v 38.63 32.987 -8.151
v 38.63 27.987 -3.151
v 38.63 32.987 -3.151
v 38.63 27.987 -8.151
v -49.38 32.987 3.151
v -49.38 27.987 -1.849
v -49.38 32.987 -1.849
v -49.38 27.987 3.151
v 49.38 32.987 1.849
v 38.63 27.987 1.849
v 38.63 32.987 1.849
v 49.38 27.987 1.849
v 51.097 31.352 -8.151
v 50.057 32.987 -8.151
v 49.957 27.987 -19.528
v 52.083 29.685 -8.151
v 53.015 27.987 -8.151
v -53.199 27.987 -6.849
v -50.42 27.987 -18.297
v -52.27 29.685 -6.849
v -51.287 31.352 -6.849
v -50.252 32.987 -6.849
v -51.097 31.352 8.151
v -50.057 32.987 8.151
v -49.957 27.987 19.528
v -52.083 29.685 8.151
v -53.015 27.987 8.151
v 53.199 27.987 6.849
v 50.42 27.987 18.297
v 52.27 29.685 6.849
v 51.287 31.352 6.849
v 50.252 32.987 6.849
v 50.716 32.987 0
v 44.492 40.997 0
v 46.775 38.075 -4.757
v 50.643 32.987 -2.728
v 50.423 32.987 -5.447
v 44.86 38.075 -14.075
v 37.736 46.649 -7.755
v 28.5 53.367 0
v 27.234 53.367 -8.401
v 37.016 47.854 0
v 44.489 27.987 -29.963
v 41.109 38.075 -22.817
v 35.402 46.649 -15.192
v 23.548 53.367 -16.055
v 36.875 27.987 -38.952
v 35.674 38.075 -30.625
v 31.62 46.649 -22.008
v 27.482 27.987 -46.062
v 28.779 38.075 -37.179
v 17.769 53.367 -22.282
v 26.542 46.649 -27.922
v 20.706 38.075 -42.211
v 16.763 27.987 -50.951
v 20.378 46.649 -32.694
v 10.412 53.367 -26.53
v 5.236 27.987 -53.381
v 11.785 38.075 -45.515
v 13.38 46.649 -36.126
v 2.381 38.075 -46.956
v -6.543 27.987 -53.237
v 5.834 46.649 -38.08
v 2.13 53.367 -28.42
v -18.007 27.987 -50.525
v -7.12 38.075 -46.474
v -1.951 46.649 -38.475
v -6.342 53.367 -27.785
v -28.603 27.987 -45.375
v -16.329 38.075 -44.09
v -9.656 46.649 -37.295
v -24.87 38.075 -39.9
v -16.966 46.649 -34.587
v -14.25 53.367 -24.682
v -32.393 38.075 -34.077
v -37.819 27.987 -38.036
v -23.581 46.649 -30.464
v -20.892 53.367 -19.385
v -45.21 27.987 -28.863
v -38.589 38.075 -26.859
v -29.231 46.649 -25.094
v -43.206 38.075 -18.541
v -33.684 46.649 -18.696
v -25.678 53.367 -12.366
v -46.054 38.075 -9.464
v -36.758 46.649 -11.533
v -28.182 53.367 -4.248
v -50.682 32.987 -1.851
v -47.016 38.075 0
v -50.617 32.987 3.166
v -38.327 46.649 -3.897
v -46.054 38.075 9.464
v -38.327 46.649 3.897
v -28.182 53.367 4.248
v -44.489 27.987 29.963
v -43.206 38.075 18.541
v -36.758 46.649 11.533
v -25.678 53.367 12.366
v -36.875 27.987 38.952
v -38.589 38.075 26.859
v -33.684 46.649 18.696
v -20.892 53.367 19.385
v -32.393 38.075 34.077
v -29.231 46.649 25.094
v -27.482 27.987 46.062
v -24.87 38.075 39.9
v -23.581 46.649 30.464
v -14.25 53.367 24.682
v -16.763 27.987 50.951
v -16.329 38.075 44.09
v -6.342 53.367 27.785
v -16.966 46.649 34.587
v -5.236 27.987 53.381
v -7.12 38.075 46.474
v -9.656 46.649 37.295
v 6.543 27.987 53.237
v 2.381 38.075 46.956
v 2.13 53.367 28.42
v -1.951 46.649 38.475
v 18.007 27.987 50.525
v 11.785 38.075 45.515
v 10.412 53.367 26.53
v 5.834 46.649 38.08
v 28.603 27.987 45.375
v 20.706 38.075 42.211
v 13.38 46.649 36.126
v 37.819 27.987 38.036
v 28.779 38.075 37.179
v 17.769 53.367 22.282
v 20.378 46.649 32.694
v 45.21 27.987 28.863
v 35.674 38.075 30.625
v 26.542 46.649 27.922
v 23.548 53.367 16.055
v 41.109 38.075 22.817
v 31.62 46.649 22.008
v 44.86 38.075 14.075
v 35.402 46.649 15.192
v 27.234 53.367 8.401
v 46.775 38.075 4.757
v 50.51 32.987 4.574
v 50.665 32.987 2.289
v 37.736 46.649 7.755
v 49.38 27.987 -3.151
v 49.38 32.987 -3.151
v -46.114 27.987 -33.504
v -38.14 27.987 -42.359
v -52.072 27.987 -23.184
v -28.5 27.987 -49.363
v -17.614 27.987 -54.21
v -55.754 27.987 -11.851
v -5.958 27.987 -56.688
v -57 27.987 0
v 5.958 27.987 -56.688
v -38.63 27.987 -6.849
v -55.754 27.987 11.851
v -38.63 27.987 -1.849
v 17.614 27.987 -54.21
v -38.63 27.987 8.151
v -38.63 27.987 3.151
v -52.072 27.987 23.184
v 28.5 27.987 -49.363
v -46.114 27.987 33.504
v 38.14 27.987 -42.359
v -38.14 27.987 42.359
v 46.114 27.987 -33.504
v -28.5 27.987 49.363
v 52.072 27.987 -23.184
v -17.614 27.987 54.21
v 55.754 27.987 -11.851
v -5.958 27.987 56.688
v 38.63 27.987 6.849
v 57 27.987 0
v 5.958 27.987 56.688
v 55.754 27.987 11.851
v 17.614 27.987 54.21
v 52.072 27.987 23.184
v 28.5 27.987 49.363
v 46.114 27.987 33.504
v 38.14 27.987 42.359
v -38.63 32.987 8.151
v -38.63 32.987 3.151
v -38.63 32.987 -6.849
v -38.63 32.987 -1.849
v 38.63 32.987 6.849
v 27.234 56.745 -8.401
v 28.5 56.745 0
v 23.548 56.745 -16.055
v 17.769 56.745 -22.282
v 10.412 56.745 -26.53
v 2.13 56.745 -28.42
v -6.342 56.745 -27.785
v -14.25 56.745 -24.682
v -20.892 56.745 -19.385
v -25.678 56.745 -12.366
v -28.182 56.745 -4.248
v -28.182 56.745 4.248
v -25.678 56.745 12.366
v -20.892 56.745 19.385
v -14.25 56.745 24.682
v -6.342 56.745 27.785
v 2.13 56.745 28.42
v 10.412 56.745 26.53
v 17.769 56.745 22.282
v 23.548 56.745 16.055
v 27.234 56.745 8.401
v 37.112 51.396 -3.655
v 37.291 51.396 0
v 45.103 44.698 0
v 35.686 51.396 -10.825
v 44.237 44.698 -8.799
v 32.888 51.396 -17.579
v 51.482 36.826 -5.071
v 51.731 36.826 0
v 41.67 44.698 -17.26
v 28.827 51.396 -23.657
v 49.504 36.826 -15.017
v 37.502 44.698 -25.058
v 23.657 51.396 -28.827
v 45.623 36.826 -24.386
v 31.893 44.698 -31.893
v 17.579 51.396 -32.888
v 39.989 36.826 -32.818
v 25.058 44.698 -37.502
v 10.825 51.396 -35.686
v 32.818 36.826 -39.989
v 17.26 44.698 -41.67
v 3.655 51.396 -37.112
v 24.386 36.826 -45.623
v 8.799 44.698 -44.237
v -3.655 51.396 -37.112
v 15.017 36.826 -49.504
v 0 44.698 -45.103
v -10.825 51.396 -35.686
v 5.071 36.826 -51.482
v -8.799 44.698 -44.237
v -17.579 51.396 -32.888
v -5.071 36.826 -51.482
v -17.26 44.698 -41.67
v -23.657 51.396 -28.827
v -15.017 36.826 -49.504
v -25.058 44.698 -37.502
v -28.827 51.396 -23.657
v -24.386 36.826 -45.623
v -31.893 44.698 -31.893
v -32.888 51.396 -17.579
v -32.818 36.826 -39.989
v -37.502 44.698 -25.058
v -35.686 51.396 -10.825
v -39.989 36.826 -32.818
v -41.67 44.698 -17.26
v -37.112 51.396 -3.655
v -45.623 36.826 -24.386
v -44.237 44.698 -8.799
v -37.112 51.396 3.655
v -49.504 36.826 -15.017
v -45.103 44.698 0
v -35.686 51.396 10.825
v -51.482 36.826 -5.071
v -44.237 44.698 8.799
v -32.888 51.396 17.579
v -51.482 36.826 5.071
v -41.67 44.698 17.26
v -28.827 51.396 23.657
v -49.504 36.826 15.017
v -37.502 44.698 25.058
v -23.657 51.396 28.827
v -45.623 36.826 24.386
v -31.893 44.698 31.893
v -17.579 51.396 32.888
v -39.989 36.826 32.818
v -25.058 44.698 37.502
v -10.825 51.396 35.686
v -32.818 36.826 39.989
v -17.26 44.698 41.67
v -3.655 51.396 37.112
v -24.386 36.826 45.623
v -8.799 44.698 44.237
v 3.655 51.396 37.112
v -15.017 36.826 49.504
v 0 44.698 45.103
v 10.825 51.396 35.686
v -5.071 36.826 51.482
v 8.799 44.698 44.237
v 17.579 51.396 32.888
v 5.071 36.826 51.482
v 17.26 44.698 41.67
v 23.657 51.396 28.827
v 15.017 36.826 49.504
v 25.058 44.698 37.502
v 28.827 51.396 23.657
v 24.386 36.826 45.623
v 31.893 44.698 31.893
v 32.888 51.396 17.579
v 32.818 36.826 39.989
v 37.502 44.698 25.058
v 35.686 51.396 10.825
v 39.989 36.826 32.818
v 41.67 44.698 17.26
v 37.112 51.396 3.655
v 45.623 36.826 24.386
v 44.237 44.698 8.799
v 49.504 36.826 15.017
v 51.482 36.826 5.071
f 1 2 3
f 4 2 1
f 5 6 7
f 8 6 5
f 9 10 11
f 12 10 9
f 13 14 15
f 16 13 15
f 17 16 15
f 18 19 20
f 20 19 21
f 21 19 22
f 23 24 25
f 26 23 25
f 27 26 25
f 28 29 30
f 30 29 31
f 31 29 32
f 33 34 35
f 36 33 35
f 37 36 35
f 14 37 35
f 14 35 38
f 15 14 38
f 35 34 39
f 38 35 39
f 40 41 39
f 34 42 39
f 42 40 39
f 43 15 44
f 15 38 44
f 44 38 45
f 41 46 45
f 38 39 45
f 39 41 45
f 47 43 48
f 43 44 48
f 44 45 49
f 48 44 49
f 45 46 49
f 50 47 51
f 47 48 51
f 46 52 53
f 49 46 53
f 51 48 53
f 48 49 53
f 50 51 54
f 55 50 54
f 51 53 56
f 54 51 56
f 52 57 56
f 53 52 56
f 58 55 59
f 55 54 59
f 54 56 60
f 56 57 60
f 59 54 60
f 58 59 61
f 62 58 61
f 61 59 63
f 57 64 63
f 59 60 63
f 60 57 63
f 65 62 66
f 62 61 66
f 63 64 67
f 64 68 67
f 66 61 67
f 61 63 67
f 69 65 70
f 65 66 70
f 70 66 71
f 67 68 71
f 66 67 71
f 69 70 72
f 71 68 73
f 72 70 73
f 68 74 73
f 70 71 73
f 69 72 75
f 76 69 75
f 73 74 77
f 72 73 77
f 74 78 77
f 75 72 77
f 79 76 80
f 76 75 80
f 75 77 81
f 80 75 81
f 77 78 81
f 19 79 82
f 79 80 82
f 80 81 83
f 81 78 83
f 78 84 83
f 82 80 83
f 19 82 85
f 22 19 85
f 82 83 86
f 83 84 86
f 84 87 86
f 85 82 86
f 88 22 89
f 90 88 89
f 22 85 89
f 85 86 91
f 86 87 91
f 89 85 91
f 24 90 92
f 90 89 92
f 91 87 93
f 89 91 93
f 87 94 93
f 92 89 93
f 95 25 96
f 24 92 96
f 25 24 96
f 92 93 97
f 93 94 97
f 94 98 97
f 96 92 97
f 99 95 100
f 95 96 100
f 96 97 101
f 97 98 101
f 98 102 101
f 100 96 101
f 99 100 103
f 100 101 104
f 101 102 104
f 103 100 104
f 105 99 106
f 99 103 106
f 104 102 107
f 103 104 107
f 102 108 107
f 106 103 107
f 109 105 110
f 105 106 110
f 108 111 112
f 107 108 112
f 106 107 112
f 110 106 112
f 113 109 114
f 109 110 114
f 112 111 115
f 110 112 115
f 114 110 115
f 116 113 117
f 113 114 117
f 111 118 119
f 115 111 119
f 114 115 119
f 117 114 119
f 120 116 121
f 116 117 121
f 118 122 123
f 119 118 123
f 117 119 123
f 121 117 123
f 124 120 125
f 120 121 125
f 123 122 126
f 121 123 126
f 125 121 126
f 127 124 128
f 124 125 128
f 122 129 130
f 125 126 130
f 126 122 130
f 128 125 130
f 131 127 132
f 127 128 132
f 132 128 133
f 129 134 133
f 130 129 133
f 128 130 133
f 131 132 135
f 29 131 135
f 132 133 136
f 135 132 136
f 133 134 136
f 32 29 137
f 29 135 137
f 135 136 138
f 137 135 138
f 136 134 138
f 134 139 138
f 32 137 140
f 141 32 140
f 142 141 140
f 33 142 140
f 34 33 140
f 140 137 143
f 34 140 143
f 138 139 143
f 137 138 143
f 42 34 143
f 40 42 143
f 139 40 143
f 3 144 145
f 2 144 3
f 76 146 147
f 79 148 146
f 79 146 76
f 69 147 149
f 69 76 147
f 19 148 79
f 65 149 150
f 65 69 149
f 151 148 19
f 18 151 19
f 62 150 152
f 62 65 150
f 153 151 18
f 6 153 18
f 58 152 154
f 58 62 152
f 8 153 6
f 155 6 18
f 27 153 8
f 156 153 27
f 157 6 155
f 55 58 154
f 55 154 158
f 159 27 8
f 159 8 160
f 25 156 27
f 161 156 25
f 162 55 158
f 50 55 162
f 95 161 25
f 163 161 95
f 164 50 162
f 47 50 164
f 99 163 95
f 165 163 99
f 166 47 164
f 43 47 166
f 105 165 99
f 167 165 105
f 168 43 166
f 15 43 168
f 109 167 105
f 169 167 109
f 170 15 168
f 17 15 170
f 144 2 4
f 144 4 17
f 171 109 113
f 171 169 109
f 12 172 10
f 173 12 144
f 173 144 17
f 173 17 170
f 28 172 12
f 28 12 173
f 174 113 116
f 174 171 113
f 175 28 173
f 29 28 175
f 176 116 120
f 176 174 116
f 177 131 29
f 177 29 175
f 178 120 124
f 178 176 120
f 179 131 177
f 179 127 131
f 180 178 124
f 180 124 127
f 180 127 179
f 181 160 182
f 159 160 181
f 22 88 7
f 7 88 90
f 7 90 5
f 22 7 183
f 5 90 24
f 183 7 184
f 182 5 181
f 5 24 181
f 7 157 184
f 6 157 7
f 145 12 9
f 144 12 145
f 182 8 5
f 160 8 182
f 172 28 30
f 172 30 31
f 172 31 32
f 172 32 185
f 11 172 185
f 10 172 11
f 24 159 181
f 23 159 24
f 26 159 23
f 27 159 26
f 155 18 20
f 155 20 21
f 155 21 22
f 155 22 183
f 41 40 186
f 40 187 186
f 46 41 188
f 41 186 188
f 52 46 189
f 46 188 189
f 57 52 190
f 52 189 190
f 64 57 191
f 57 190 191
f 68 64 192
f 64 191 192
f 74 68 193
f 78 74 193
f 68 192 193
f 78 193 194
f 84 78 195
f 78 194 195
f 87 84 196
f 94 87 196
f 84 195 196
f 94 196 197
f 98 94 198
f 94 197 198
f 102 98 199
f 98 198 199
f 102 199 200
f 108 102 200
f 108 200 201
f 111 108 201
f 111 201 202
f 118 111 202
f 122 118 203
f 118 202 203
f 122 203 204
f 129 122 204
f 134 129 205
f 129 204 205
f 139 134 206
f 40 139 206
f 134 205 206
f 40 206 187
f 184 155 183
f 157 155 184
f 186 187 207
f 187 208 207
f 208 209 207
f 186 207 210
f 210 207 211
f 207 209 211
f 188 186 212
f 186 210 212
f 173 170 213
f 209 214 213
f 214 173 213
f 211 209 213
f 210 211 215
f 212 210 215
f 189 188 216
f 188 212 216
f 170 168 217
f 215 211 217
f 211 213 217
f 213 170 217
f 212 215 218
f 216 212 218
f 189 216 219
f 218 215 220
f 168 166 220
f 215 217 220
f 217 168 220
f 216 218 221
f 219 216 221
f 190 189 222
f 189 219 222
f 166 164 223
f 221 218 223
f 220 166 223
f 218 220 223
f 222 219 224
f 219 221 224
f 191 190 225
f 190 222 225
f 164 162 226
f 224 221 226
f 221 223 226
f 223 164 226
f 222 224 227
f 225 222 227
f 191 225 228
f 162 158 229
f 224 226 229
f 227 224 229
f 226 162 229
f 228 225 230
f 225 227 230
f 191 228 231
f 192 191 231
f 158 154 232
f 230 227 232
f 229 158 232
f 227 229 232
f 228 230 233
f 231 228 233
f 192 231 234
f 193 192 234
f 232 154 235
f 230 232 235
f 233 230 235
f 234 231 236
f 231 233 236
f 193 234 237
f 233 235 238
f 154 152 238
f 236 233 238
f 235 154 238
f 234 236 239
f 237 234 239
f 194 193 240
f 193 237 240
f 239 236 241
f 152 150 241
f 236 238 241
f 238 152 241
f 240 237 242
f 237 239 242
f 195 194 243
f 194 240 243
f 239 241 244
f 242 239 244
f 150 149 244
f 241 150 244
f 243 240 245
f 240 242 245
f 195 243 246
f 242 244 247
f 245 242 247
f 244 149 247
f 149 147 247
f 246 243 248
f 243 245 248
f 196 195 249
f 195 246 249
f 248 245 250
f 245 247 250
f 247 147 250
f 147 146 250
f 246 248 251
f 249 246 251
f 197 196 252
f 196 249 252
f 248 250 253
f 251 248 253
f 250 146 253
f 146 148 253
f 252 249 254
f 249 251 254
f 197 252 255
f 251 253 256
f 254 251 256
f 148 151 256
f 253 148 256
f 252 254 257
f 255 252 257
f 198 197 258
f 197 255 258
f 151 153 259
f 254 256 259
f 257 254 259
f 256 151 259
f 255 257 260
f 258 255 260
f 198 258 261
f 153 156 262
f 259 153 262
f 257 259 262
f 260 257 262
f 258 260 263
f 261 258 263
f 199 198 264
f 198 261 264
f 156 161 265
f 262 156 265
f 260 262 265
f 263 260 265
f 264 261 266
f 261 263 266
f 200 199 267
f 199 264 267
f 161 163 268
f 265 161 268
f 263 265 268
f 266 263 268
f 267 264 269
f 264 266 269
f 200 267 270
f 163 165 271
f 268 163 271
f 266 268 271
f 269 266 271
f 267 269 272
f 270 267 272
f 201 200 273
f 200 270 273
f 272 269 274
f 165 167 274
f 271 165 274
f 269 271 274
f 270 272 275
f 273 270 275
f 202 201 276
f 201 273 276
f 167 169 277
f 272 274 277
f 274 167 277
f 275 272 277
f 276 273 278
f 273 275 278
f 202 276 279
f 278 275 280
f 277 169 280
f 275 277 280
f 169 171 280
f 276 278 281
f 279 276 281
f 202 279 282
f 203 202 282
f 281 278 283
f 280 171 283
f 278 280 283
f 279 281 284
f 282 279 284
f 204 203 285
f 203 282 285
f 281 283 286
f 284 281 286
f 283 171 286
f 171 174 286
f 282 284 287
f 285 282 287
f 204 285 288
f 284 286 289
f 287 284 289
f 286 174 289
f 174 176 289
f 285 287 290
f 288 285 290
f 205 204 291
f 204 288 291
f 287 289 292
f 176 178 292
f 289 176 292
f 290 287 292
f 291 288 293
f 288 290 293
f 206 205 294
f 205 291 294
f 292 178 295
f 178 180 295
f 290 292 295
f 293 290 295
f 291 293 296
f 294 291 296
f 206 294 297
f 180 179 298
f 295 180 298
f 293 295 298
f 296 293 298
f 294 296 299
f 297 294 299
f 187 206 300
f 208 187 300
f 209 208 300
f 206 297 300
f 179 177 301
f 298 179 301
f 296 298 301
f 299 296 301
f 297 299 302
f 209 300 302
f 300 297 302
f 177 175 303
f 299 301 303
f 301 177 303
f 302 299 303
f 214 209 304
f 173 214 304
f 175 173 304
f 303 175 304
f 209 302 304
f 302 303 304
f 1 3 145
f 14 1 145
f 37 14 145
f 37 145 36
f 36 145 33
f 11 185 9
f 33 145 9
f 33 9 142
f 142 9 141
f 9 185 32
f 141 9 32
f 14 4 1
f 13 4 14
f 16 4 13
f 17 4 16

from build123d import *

# Parameters (mm, degrees)
SALIENTE_EXTRUIR1_DEPTH = 5


with BuildPart() as part:
    # Croquis2 → Revolución2 (revolve)
    with BuildSketch(Plane.XY):
        with BuildLine():
            Line((57, 27.986603938), (53.637673328, 27.986603938))
            ThreePointArc((53.637673328, 27.986603938), (42.984719481, 42.574216272), (28.5, 53.366656257))
            Line((28.5, 53.366656257), (28.5, 56.745043836))
            ThreePointArc((28.5, 56.745043836), (45.103486188, 44.698160294), (57, 27.986603938))
        make_face()
    revolve(axis=Axis((0, 10.058437275, 0), (0, 1, 0)))

    # Croquis3 → Saliente-Extruir1 (add)
    with BuildSketch(Plane.XZ.offset(-27.986603938)):
        with BuildLine():
            Line((38.630056924, 1.848931625), (49.379751122, 1.848931625))
            Line((49.379751122, 1.848931625), (49.379751122, -3.151068375))
            Line((49.379751122, -3.151068375), (38.630056924, -3.151068375))
            Line((38.630056924, -3.151068375), (38.630056924, -8.151068375))
            Line((38.630056924, -8.151068375), (53.014715734, -8.151068375))
            ThreePointArc((53.014715734, -8.151068375), (53.633642946, -0.657528958), (53.198610279, 6.848931625))
            Line((53.198610279, 6.848931625), (38.630056924, 6.848931625))
            Line((38.630056924, 6.848931625), (38.630056924, 1.848931625))
        make_face()
        with BuildLine():
            Line((-38.630056924, 8.151068375), (-53.014715734, 8.151068375))
            ThreePointArc((-53.014715734, 8.151068375), (-53.633642946, 0.657528958), (-53.198610279, -6.848931625))
            Line((-53.198610279, -6.848931625), (-38.630056924, -6.848931625))
            Line((-38.630056924, -6.848931625), (-38.630056924, -1.848931625))
            Line((-38.630056924, -1.848931625), (-49.379751122, -1.848931625))
            Line((-49.379751122, -1.848931625), (-49.379751122, 3.151068375))
            Line((-49.379751122, 3.151068375), (-38.630056924, 3.151068375))
            Line((-38.630056924, 3.151068375), (-38.630056924, 8.151068375))
        make_face()
    extrude(amount=-SALIENTE_EXTRUIR1_DEPTH)


solid = part.part
